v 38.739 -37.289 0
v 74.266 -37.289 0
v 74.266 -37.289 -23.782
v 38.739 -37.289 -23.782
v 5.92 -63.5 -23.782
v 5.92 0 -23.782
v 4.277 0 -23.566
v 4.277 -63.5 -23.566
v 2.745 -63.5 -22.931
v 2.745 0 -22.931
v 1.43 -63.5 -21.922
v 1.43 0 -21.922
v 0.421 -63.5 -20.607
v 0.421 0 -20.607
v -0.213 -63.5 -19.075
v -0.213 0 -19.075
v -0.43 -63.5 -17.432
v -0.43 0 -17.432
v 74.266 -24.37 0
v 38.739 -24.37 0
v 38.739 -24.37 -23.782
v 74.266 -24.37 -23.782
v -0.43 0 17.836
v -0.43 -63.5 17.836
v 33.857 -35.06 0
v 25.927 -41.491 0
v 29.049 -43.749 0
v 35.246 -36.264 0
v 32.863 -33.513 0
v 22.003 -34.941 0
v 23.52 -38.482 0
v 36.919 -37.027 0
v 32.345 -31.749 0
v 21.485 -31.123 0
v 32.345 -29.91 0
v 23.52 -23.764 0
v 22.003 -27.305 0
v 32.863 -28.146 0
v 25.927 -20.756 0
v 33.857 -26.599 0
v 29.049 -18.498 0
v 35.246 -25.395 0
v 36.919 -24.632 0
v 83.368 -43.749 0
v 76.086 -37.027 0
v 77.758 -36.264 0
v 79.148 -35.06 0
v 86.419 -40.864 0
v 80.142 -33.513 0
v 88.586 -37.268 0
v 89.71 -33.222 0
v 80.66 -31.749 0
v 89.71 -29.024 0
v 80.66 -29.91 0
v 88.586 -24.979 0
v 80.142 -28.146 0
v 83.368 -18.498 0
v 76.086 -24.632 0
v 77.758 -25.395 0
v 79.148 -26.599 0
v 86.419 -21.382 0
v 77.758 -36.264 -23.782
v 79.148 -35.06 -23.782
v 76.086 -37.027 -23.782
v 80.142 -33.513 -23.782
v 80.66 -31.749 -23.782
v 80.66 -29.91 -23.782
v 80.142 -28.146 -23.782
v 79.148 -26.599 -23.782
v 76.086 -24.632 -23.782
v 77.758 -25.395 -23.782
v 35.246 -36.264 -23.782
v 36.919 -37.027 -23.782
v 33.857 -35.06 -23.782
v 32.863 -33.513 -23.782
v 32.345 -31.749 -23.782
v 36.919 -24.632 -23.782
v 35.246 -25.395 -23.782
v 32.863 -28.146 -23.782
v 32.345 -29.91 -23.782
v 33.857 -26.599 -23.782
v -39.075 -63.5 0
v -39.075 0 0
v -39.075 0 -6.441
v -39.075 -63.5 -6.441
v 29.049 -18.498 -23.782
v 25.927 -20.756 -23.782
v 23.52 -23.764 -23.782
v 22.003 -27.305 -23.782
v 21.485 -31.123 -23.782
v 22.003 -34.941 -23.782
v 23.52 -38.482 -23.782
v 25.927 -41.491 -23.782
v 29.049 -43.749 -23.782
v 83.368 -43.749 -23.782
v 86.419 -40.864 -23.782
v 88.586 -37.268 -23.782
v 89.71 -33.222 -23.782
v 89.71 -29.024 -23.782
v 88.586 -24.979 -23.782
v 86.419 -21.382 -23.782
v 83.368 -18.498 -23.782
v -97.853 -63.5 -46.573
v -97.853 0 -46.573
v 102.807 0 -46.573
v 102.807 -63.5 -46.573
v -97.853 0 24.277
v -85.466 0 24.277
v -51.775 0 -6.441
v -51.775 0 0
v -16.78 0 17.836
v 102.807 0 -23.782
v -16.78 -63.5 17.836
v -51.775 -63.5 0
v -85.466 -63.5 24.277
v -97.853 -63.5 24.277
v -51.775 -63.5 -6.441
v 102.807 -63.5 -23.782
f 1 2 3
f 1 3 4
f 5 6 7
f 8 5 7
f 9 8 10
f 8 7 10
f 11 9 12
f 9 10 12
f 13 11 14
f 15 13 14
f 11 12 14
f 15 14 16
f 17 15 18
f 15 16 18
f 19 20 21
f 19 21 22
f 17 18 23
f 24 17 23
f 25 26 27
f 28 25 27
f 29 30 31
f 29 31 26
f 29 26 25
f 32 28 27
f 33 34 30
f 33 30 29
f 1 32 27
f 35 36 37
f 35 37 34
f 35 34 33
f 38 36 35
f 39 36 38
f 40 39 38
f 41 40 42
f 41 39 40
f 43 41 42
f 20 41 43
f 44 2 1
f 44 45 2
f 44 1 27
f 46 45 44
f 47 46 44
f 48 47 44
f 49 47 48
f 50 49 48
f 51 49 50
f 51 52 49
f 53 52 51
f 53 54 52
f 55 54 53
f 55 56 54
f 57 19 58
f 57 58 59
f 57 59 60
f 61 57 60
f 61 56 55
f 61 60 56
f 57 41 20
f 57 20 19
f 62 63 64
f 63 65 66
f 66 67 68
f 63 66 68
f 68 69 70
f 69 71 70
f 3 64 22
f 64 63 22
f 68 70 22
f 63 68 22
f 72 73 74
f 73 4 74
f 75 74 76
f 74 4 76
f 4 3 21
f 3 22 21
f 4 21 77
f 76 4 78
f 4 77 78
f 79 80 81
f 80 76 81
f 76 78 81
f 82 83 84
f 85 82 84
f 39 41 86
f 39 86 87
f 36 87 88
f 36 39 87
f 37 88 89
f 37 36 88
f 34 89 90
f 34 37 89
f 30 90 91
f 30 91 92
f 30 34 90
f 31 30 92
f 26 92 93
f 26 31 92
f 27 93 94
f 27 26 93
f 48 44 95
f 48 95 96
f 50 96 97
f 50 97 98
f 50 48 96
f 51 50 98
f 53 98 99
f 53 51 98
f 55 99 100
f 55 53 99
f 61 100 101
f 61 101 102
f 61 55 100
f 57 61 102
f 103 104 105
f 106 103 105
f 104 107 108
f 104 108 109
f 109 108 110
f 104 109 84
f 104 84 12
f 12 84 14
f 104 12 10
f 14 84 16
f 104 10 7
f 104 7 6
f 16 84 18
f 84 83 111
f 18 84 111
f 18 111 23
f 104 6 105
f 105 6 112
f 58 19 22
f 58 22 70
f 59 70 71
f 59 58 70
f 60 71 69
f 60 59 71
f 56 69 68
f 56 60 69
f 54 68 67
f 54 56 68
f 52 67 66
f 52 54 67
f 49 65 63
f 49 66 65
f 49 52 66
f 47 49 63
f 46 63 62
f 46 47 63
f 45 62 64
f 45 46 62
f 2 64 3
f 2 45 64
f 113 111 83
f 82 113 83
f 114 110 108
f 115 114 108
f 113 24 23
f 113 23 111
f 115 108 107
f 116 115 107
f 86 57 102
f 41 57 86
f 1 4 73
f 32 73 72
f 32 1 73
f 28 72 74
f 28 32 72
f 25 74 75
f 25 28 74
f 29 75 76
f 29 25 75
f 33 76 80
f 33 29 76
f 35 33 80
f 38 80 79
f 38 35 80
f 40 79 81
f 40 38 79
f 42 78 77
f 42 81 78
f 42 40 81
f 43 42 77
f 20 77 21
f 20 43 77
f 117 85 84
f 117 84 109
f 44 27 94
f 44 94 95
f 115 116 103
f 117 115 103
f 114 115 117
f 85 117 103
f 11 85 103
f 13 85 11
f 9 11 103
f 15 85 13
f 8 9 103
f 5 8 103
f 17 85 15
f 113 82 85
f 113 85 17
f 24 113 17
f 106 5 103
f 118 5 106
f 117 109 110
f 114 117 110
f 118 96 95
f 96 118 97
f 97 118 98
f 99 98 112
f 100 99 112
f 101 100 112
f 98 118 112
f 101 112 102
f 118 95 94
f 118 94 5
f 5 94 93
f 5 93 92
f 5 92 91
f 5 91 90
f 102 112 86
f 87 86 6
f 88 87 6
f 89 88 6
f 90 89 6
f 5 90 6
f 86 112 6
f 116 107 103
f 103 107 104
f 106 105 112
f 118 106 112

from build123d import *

# Parameters (mm, degrees)
F1_DEPTH = 63.5
F3_DEPTH = 25.4


with BuildPart() as f1:
    # F0 (on Front) → F1 (new body)
    with BuildSketch(Plane.XZ):
        with BuildLine():
            Line((-97.852716, 24.277382), (-97.852716, -46.572937))
            Line((-97.852716, -46.572937), (102.807284, -46.572937))
            Line((102.807284, -46.572937), (102.807284, -23.781926))
            Line((102.807284, -23.781926), (5.920396, -23.781926))
            ThreePointArc((5.920396, -23.781926), (1.430268, -21.922054), (-0.429604, -17.431926))
            Line((-0.429604, -17.431926), (-0.429604, 17.836444))
            Line((-0.429604, 17.836444), (-16.779679, 17.836444))
            Line((-16.779679, 17.836444), (-39.075235, 0))
            Line((-39.075235, 0), (-39.075235, -6.440938))
            Line((-39.075235, -6.440938), (-51.775235, -6.440938))
            Line((-51.775235, -6.440938), (-51.775235, 0))
            Line((-51.775235, 0), (-85.466295, 24.277382))
            Line((-85.466295, 24.277382), (-97.852716, 24.277382))
        make_face()
    extrude(amount=F1_DEPTH)

    # F2 (on Top) → F3 (join)
    with BuildSketch(Plane.XY):
        with BuildLine():
            Line((83.36813, -18.497726), (29.049411, -18.497726))
            ThreePointArc((29.049411, -18.497726), (21.484507, -31.123157), (29.049411, -43.748587))
            Line((29.049411, -43.748587), (83.36813, -43.748587))
            ThreePointArc((83.36813, -43.748587), (89.852645, -31.123157), (83.36813, -18.497726))
        make_face()
        with BuildLine():
            ThreePointArc((38.738701, -37.289064), (32.279179, -30.829541), (38.738701, -24.370018))
            Line((38.738701, -24.370018), (74.266076, -24.370018))
            ThreePointArc((74.266076, -24.370018), (80.725599, -30.829541), (74.266076, -37.289064))
            Line((74.266076, -37.289064), (38.738701, -37.289064))
        make_face(mode=Mode.SUBTRACT)
    extrude(amount=-F3_DEPTH)


solid = f1.part
